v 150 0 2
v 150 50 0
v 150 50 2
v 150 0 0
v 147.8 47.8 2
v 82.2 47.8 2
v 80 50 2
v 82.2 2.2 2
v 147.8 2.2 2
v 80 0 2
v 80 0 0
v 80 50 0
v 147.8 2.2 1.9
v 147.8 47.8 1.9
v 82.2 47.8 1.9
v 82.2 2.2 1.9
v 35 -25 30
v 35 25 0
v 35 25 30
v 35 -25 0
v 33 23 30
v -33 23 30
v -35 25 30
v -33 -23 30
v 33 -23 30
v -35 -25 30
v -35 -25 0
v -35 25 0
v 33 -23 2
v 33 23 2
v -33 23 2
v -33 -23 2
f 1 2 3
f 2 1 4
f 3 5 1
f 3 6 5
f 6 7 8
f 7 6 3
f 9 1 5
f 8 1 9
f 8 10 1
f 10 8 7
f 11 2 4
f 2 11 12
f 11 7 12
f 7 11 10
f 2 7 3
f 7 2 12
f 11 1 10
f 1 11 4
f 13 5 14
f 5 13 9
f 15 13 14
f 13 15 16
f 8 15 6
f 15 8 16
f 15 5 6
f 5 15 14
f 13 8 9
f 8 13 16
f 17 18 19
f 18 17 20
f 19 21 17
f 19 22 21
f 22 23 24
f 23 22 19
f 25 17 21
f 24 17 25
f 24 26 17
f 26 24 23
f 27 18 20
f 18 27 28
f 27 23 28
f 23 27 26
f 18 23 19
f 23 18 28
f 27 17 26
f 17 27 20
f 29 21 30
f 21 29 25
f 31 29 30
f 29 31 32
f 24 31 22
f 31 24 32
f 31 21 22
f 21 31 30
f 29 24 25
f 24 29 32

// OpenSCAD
// ====================================================================
// Parameters for the Enclosure and Lid
// ====================================================================

// Box Dimensions (Outer)
box_outer_x = 70; // Outer X dimension of the box (mm)
box_outer_y = 50; // Outer Y dimension of the box (mm)
box_outer_z = 30; // Outer Z dimension of the box (mm)

// Box Wall/Floor Thickness
wall_thickness = 2; // Wall and floor thickness (mm)

// Lid Dimensions
lid_plate_x = 70;   // Plate X dimension of the lid (mm)
lid_plate_y = 50;   // Plate Y dimension of the lid (mm)
lid_plate_z = 2;    // Thickness of the main plate (mm)

lip_wall_thickness = 1.5; // Wall thickness of the lip (mm)
lip_height = 4;        // Height of the lip (mm)

// Clearance for sliding fit: Total clearance on each side is 0.2 mm, so total reduction is 0.4 mm.
clearance_total = 0.4; // Total required clearance (2 * 0.2 mm)
specified_lip_x = 65.6; // Outer size of the lip section X (mm) - This was specified as the outer dimension for sliding fit
specified_lip_y = 45.6; // Outer size of the lip section Y (mm)

// Gap between parts when printing together
print_gap = 10; // Gap between box and lid in X direction (mm)

// Resolution setting for curves
$fn = 64;

// ====================================================================
// Part 1: The Box
// ====================================================================

module enclosure_box() {
    // Calculate inner dimensions
    inner_x = box_outer_x - (2 * wall_thickness); // 70 - 4 = 66
    inner_y = box_outer_y - (2 * wall_thickness); // 50 - 4 = 46
    inner_z = box_outer_z - wall_thickness;      // 30 - 2 = 28

    difference() {
        // 1. Outer shell (Solid block)
        cube([box_outer_x, box_outer_y, box_outer_z]);

        // 2. Cut out the interior space
        translate([wall_thickness, wall_thickness, wall_thickness]) {
            cube([inner_x, inner_y, inner_z]);
        }
    }
}

// ====================================================================
// Part 2: The Lid
// ====================================================================

module enclosure_lid() {
    // Calculate the dimensions of the lip structure based on specified outer size (65.6 x 45.6)
    
    // Lip Outer Dimensions (as specified for sliding fit)
    lip_outer_x = specified_lip_x; // 65.6 mm
    lip_outer_y = specified_lip_y; // 45.6 mm

    // Calculate inner dimensions of the lip wall
    lip_inner_x = lip_outer_x - (2 * lip_wall_thickness); // 65.6 - 3.0 = 62.6
    lip_inner_y = lip_outer_y - (2 * lip_wall_thickness); // 45.6 - 3.0 = 42.6

    // Center offset calculation for the lip structure on the plate
    center_offset_x = (lid_plate_x - lip_outer_x) / 2; // (70 - 65.6) / 2 = 2.2
    center_offset_y = (lid_plate_y - lip_outer_y) / 2; // (50 - 45.6) / 2 = 2.2

    difference() {
        // 1. Main plate body (70 x 50 x 2)
        cube([lid_plate_x, lid_plate_y, lid_plate_z]);

        // 2. Cut out the space where the lip sits on top of the main plate
        // This cut must be centered and extend through its thickness (2mm) + slightly more for safety
        translate([center_offset_x, center_offset_y, lid_plate_z - 0.1]) { // Start cutting just below the surface
            cube([lip_outer_x, lip_outer_y, lip_height + 0.5]);
        }

        // 3. Cut out the hollow space inside the lip structure (to make it a wall)
        // This cut is performed on the top face of the plate, starting at Z = lid_plate_z + lip_height - 0.1
        translate([center_offset_x, center_offset_y, lid_plate_z + lip_height - 0.1]) {
            cube([lip_inner_x, lip_inner_y, lip_height + 0.5]);
        }
    }
}

// ====================================================================
// Assembly and Rendering
// ====================================================================

// The lid is printed upside down (Z=0 is the bottom of the plate)
// We place the lid next to it in X, starting at box_outer_x + print_gap.
translate([box_outer_x + print_gap, 0, 0]) {
    enclosure_lid();
}

// Place the box centered on the bed (X=0, Y=0)
translate([-(box_outer_x / 2), -(box_outer_y / 2), 0]) {
    enclosure_box();
}
